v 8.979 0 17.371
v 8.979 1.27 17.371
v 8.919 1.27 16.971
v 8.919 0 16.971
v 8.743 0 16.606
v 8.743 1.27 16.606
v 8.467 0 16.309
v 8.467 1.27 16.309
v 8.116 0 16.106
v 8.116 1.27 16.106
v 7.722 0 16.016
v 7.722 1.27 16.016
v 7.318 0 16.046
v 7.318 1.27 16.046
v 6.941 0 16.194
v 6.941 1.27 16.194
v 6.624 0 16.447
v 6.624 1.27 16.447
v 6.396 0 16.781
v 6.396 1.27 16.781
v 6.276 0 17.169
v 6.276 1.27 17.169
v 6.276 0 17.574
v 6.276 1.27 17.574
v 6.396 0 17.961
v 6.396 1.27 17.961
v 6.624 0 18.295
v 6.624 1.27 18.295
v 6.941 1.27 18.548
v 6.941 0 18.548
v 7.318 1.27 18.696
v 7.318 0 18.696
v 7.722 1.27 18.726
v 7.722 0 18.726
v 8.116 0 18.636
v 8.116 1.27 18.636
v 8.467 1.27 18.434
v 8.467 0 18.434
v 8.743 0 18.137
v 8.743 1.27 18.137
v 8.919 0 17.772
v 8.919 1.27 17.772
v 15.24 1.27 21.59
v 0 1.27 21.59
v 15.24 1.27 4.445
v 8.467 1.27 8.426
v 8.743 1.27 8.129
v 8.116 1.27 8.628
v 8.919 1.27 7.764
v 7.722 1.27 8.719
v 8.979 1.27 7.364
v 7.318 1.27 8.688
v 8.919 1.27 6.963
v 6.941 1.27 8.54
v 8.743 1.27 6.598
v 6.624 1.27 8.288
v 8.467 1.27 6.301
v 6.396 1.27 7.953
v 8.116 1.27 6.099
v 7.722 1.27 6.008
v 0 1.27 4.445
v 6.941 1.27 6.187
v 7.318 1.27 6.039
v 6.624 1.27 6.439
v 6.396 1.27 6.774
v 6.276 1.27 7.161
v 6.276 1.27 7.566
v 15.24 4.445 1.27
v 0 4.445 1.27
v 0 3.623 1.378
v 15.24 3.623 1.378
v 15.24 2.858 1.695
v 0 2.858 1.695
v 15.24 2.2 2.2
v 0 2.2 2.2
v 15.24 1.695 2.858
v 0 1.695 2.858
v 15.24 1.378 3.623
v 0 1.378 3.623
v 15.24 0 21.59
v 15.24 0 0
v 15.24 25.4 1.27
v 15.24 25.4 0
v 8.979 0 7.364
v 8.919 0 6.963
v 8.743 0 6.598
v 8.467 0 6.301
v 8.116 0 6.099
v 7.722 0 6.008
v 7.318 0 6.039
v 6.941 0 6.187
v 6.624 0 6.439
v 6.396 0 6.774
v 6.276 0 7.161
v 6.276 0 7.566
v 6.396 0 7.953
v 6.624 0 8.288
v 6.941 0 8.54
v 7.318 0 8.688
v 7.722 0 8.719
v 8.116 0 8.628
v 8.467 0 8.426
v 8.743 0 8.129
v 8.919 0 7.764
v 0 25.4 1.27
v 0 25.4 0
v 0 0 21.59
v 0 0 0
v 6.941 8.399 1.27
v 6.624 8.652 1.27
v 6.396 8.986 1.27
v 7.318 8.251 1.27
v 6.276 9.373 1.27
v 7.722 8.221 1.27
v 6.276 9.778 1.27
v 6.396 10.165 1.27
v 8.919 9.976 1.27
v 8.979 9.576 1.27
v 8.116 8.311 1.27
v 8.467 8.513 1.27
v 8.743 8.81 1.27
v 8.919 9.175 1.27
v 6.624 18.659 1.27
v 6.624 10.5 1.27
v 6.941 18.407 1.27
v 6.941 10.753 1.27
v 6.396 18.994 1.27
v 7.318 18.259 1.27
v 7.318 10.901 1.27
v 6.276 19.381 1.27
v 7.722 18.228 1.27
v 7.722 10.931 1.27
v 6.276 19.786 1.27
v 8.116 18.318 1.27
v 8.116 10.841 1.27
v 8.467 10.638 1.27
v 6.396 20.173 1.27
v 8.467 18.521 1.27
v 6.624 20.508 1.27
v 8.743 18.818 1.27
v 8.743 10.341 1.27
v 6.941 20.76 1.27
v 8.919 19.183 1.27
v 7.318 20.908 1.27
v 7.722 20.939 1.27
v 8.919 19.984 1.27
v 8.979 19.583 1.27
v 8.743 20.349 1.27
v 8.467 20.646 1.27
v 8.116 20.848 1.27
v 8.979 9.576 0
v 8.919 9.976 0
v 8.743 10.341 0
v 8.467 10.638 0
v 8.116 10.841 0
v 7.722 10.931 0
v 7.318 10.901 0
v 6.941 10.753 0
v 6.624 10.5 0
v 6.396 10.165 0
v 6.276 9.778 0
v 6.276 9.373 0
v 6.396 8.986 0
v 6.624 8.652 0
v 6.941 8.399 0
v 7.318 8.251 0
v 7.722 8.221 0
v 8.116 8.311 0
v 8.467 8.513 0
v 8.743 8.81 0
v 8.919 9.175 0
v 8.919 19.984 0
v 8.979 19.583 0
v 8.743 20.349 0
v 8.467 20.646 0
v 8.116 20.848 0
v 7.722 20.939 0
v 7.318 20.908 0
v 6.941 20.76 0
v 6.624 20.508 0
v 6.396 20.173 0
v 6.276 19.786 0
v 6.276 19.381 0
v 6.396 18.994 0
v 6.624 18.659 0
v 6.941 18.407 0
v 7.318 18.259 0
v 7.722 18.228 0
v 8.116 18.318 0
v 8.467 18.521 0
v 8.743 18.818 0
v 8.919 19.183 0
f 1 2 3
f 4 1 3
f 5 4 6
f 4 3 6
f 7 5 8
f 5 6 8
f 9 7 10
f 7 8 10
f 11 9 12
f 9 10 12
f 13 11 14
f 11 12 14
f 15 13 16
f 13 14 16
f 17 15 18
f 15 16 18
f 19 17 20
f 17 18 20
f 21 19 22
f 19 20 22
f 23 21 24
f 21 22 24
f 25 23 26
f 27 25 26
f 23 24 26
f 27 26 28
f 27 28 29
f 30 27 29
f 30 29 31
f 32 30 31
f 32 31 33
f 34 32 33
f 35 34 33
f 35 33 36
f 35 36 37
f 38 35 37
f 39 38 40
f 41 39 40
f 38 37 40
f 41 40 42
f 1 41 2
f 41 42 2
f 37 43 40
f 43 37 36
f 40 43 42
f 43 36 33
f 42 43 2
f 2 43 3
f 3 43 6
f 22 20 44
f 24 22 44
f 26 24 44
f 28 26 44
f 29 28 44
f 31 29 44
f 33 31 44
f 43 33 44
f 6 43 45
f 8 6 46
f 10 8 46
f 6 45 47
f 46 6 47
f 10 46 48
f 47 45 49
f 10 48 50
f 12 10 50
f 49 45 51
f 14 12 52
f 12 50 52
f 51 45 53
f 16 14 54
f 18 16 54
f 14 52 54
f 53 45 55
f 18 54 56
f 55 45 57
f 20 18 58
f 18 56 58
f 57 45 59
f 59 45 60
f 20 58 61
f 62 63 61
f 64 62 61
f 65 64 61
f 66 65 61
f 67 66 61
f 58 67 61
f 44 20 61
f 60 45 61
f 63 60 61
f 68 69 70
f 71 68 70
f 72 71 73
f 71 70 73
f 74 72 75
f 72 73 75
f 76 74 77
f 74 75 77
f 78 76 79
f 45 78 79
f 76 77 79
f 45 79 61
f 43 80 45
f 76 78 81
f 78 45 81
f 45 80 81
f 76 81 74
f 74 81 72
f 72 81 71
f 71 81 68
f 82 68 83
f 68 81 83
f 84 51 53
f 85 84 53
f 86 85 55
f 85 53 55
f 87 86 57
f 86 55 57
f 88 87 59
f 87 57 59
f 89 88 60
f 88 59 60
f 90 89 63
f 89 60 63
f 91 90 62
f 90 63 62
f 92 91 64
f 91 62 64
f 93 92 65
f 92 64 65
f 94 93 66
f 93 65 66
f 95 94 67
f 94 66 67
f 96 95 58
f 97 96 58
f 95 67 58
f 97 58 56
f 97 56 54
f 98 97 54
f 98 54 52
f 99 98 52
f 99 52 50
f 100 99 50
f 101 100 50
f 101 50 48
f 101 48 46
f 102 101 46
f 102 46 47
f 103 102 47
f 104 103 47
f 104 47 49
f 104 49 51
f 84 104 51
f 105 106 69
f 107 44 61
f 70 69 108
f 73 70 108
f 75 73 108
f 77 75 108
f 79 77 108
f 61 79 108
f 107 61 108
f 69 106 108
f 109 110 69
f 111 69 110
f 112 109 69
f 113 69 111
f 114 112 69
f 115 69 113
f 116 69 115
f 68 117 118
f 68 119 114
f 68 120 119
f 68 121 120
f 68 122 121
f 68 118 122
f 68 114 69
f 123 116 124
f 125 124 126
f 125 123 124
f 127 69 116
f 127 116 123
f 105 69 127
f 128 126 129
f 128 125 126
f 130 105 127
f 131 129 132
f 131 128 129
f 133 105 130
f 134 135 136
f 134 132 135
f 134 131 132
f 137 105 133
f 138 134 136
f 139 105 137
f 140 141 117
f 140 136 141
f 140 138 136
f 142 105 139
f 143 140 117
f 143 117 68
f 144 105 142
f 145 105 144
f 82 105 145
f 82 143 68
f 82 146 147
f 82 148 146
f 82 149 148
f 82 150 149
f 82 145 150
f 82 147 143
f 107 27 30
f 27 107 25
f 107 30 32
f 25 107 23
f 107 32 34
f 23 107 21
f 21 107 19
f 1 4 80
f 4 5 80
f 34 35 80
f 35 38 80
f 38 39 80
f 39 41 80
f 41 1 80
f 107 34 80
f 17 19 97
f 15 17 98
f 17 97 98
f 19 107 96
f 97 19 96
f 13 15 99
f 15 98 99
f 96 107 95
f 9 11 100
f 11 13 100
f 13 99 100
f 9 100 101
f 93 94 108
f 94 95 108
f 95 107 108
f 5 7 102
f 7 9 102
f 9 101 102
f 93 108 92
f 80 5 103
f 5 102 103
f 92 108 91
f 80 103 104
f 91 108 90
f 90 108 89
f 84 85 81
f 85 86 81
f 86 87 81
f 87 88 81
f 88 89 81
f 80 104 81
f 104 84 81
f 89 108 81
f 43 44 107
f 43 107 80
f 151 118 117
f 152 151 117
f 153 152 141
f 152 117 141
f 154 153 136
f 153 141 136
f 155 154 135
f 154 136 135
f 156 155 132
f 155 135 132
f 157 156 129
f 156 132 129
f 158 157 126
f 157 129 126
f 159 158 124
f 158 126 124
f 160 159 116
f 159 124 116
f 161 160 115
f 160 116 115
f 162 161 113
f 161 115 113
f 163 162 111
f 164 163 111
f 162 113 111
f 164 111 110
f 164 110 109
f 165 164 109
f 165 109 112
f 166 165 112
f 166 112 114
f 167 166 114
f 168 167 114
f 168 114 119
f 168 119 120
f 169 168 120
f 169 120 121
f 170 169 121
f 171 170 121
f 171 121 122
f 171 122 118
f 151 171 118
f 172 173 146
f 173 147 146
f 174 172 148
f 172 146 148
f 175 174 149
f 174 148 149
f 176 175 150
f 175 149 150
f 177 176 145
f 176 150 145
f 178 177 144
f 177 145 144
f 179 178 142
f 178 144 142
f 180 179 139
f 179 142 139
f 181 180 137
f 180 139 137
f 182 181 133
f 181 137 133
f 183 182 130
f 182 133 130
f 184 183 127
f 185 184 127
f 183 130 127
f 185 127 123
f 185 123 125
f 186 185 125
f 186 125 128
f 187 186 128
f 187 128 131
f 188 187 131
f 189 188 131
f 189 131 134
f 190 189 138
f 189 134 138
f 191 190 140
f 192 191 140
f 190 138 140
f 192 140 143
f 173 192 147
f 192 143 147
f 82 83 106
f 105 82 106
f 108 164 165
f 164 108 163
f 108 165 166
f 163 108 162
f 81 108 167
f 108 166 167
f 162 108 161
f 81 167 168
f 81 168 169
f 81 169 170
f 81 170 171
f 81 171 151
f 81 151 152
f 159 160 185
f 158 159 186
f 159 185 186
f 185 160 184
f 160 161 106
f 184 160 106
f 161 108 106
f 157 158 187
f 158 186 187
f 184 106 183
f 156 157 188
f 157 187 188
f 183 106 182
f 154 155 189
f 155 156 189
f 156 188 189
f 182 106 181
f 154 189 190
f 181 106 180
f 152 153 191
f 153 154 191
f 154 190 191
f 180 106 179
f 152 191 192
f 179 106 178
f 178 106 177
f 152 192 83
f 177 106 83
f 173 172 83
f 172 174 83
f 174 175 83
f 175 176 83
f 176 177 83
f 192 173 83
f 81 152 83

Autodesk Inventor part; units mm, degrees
ref_plane "YZ Plane" through (0, 0, 0) normal (1, 0, 0) x (0, 1, 0)
ref_plane "XZ Plane" through (0, 0, 0) normal (0, 1, 0) x (-1, 0, 0)
ref_plane "XY Plane" through (0, 0, 0) normal (0, 0, 1) x (1, 0, 0)
sketch "Sketch1" plane through (0, 0, 0) normal (0, 0, 1) x (1, 0, 0)
  line L0 (0, 0) -> (15.24, 0)
  line L1 (15.24, 0) -> (15.24, 25.4)
  line L2 (15.24, 25.4) -> (0, 25.4)
  line L3 (0, 25.4) -> (0, 0)
  dimension "d0" = 25.4
  dimension "d1" = 15.24
extrude "Extrusion1" add sketch "Sketch1" along normal blind 1.27
sketch "Sketch2" plane through (0, 0, 1.27) normal (0, 0, 1) x (1, 0, 0)
  line L0 (15.24, 0) -> (15.24, 25.4) projected
  line L1 (0, 0) -> (15.24, 0)
  line L2 (15.24, 0) -> (15.24, 1.27)
  line L3 (15.24, 1.27) -> (0, 1.27)
  line L4 (0, 1.27) -> (0, 0)
  dimension "d4" = 1.27
extrude "Extrusion2" add sketch "Sketch2" along normal blind 20.32
sketch "Sketch3" plane through (0, 0, 1.27) normal (0, 0, 1) x (1, 0, 0)
  circle A0 centre (7.62, 19.5834) radius 1.3589
  circle A1 centre (7.62, 9.5758) radius 1.3589
  line L0 (15.24, 1.27) -> (15.24, 25.4) projected
  line L1 (0, 0) -> (15.24, 0) projected
  dimension "d7" = 2.7178
  dimension "d8" = 2.7178
  dimension "d9" = 7.62
  dimension "d10" = 7.62
  dimension "d11" = 10.0076
  dimension "d12" = 9.5758
extrude "Extrusion3" cut sketch "Sketch3" against normal blind 25.4
sketch "Sketch4" plane through (0, 1.27, 26.67) normal (0, 1, 0) x (1, 0, 0)
  circle A0 centre (7.62, 19.3065) radius 1.3589
  circle A1 centre (7.62, 9.2989) radius 1.3589
  line L0 (20.32, 1.27) -> (20.32, 25.4)
  line L1 (0, 0) -> (20.32, 0)
  line L2 (15.24, 25.4) -> (15.24, 5.08) projected
  dimension "d19" = 2.7178
  dimension "d15" = 2.7178
  dimension "d17" = 10.0076
  dimension "d25" = 7.62
  dimension "d26" = 7.62
extrude "Extrusion4" cut sketch "Sketch4" against normal blind 25.4
fillet "Fillet1" radius 3.175 1 edges at (7.62, 1.27, 1.27)
properties part number "Triangle connector"
